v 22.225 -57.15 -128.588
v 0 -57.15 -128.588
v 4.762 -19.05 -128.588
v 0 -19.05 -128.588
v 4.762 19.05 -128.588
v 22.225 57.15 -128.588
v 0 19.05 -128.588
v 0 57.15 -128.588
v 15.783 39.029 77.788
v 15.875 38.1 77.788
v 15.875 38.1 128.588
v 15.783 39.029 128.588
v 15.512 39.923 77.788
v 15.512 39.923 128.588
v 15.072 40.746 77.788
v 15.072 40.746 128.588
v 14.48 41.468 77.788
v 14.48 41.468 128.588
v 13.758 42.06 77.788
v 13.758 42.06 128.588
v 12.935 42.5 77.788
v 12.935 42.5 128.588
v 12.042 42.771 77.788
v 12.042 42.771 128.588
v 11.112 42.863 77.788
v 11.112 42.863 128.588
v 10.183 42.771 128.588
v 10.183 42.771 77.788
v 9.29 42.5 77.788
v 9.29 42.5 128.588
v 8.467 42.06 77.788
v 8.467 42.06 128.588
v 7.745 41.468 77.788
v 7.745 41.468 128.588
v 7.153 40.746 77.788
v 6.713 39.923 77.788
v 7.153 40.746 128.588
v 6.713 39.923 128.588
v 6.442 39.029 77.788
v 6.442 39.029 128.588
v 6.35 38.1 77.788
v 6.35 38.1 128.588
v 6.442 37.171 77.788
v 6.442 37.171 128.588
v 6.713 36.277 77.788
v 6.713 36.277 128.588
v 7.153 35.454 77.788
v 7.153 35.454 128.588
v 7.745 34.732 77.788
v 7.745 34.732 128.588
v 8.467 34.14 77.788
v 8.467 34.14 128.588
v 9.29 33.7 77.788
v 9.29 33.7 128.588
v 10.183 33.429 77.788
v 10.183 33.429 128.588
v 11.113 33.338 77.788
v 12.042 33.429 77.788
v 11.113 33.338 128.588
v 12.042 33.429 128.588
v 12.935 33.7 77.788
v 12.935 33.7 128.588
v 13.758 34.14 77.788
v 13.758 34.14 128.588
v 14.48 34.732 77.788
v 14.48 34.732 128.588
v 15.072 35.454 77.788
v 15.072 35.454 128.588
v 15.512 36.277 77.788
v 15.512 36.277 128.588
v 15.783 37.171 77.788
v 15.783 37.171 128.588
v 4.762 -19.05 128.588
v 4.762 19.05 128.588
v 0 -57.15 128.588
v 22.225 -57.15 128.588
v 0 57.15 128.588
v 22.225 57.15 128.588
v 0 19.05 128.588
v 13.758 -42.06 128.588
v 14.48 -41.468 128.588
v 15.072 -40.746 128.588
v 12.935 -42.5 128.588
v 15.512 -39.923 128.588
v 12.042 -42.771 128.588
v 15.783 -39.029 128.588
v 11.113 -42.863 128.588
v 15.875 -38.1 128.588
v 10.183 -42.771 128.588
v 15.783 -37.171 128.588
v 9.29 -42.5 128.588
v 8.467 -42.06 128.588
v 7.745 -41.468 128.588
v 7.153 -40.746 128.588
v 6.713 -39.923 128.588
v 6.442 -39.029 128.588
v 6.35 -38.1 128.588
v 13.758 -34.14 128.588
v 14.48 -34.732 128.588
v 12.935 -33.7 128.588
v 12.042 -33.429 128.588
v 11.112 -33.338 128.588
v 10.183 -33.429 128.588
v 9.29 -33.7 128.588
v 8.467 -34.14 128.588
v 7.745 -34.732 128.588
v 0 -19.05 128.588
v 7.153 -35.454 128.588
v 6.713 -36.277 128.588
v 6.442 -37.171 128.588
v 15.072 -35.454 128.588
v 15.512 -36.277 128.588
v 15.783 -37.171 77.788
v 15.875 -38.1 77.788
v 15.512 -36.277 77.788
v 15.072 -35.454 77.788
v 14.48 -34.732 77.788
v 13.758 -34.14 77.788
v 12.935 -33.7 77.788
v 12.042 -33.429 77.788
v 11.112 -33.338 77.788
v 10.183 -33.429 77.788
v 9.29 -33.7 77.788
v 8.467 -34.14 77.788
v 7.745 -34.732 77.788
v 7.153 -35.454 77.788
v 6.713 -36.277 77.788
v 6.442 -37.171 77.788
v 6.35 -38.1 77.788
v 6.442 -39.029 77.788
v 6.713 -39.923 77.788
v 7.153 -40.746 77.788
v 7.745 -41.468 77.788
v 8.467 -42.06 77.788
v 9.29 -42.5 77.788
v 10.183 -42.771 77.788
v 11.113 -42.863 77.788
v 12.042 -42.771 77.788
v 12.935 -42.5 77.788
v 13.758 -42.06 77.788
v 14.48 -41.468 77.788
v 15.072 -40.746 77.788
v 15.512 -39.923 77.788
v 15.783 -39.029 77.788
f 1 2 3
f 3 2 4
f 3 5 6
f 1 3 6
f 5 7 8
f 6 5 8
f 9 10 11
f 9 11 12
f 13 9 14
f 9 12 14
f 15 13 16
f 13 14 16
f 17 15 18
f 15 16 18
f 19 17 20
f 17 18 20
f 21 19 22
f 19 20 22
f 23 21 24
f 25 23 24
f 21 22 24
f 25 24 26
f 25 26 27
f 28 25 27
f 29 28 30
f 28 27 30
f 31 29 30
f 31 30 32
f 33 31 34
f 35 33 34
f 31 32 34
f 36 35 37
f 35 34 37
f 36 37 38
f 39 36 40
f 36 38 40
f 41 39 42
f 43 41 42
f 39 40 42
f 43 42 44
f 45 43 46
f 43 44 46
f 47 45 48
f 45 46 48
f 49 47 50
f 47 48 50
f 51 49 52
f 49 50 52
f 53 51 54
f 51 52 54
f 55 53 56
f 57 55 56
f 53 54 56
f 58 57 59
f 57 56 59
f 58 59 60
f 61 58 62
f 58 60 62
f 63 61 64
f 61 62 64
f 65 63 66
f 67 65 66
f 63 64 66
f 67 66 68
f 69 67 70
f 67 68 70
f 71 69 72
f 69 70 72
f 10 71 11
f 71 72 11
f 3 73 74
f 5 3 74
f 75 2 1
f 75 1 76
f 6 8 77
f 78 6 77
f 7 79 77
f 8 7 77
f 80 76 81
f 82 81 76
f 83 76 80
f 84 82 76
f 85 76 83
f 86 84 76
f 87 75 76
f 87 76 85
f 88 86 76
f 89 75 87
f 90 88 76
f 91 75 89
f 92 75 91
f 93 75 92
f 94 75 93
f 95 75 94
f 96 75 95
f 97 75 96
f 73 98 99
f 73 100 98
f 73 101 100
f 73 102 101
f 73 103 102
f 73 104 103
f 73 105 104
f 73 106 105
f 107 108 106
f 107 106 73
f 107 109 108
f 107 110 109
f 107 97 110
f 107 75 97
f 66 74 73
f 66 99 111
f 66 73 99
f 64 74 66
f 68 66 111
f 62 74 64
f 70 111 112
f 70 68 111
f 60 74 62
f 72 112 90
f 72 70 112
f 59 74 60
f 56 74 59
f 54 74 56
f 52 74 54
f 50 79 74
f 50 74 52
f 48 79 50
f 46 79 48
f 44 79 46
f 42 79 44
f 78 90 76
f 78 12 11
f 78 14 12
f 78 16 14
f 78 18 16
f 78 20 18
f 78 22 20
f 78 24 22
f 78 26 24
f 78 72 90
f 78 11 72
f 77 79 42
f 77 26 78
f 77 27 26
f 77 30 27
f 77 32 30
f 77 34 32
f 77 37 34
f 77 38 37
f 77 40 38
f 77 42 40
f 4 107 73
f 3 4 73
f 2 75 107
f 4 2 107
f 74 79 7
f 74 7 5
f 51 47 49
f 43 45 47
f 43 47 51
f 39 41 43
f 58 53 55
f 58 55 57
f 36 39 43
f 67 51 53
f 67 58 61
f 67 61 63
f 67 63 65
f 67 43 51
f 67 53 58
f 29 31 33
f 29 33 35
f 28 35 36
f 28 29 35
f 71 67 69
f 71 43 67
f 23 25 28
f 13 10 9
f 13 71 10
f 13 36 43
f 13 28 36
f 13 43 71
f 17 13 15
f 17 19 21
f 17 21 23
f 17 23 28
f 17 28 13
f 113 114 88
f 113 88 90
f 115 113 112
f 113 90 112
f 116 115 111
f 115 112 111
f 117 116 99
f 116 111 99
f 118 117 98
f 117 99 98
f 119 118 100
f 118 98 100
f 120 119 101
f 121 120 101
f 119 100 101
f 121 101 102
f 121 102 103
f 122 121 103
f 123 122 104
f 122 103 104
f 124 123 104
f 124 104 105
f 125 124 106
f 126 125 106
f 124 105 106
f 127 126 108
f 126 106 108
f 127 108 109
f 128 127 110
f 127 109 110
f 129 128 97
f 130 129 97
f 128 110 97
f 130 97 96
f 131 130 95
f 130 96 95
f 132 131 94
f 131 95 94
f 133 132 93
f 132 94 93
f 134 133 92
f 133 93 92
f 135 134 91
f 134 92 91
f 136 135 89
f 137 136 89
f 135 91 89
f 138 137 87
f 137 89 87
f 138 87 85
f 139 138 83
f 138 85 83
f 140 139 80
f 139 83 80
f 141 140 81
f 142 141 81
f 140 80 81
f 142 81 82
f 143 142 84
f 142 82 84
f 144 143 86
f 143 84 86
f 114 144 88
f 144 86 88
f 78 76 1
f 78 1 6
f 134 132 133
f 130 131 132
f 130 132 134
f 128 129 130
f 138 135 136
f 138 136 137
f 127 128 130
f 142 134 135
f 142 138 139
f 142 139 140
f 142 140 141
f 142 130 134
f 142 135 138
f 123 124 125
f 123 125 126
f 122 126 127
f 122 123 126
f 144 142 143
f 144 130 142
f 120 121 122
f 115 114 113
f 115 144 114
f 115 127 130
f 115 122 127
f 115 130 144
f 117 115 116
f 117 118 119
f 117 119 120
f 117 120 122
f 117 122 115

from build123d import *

# Parameters (mm, degrees)
F0_W     = 114.3
F0_H     = 257.175
F1_DEPTH = 22.225
F2_W     = 4.7625
F2_H     = 38.1
F3_DEPTH = 257.176
F4_R     = 4.7625
F5_DEPTH = 50.8


with BuildPart() as f1:
    # F0 (on Right) → F1 (new body)
    with BuildSketch(Plane.YZ):
        Rectangle(F0_W, F0_H)
    extrude(amount=F1_DEPTH)

    # F2 (on face) → F3 (cut, through all)
    with BuildSketch(Plane.XY.offset(128.5875)):
        with Locations((2.38125, 0)):
            Rectangle(F2_W, F2_H)
    extrude(amount=-F3_DEPTH, mode=Mode.SUBTRACT)

    # F4 (on face) → F5 (cut)
    with BuildSketch(Plane.XY.offset(128.5875)):
        with Locations((11.1125, -38.1)):
            Circle(F4_R)
        with Locations((11.1125, 38.1)):
            Circle(F4_R)
    extrude(amount=-F5_DEPTH, mode=Mode.SUBTRACT)


solid = f1.part
